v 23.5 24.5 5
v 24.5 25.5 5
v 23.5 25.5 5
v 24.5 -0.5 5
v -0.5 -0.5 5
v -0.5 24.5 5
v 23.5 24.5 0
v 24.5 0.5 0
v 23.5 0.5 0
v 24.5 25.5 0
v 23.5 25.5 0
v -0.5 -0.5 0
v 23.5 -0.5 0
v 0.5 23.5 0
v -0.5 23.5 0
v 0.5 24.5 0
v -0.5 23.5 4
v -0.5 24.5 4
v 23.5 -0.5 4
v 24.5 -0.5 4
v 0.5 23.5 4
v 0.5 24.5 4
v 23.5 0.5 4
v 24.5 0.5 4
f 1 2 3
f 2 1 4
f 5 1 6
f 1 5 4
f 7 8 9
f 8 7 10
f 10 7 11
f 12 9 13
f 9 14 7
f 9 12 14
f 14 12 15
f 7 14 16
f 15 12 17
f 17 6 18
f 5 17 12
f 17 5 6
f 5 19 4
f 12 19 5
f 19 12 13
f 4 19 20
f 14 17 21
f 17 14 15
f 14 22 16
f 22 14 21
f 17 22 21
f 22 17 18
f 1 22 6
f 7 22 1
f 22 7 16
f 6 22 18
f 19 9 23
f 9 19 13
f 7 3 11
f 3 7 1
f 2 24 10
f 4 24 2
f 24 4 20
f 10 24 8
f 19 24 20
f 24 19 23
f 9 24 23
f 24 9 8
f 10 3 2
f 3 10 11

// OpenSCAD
union() {
    translate([0, 0, 2.5]) cube([1, 1, 5], center=true);
    translate([0, 1, 2.5]) cube([1, 1, 5], center=true);
    translate([0, 2, 2.5]) cube([1, 1, 5], center=true);
    translate([0, 3, 2.5]) cube([1, 1, 5], center=true);
    translate([0, 4, 2.5]) cube([1, 1, 5], center=true);
    translate([0, 5, 2.5]) cube([1, 1, 5], center=true);
    translate([0, 6, 2.5]) cube([1, 1, 5], center=true);
    translate([0, 7, 2.5]) cube([1, 1, 5], center=true);
    translate([0, 8, 2.5]) cube([1, 1, 5], center=true);
    translate([0, 9, 2.5]) cube([1, 1, 5], center=true);
    translate([0, 10, 2.5]) cube([1, 1, 5], center=true);
    translate([0, 11, 2.5]) cube([1, 1, 5], center=true);
    translate([0, 12, 2.5]) cube([1, 1, 5], center=true);
    translate([0, 13, 2.5]) cube([1, 1, 5], center=true);
    translate([0, 14, 2.5]) cube([1, 1, 5], center=true);
    translate([0, 15, 2.5]) cube([1, 1, 5], center=true);
    translate([0, 16, 2.5]) cube([1, 1, 5], center=true);
    translate([0, 17, 2.5]) cube([1, 1, 5], center=true);
    translate([0, 18, 2.5]) cube([1, 1, 5], center=true);
    translate([0, 19, 2.5]) cube([1, 1, 5], center=true);
    translate([0, 20, 2.5]) cube([1, 1, 5], center=true);
    translate([0, 21, 2.5]) cube([1, 1, 5], center=true);
    translate([0, 22, 2.5]) cube([1, 1, 5], center=true);
    translate([0, 23, 2.5]) cube([1, 1, 5], center=true);
    translate([0, 24, 4.5]) color([1, 0, 0]) cube([1, 1, 1], center=true);
    translate([1, 0, 2.5]) cube([1, 1, 5], center=true);
    translate([1, 1, 2.5]) cube([1, 1, 5], center=true);
    translate([1, 2, 2.5]) cube([1, 1, 5], center=true);
    translate([1, 3, 2.5]) cube([1, 1, 5], center=true);
    translate([1, 4, 2.5]) cube([1, 1, 5], center=true);
    translate([1, 5, 2.5]) cube([1, 1, 5], center=true);
    translate([1, 6, 2.5]) cube([1, 1, 5], center=true);
    translate([1, 7, 2.5]) cube([1, 1, 5], center=true);
    translate([1, 8, 2.5]) cube([1, 1, 5], center=true);
    translate([1, 9, 2.5]) cube([1, 1, 5], center=true);
    translate([1, 10, 2.5]) cube([1, 1, 5], center=true);
    translate([1, 11, 2.5]) cube([1, 1, 5], center=true);
    translate([1, 12, 2.5]) cube([1, 1, 5], center=true);
    translate([1, 13, 2.5]) cube([1, 1, 5], center=true);
    translate([1, 14, 2.5]) cube([1, 1, 5], center=true);
    translate([1, 15, 2.5]) cube([1, 1, 5], center=true);
    translate([1, 16, 2.5]) cube([1, 1, 5], center=true);
    translate([1, 17, 2.5]) cube([1, 1, 5], center=true);
    translate([1, 18, 2.5]) cube([1, 1, 5], center=true);
    translate([1, 19, 2.5]) cube([1, 1, 5], center=true);
    translate([1, 20, 2.5]) cube([1, 1, 5], center=true);
    translate([1, 21, 2.5]) cube([1, 1, 5], center=true);
    translate([1, 22, 2.5]) cube([1, 1, 5], center=true);
    translate([1, 23, 2.5]) cube([1, 1, 5], center=true);
    translate([1, 24, 2.5]) cube([1, 1, 5], center=true);
    translate([2, 0, 2.5]) cube([1, 1, 5], center=true);
    translate([2, 1, 2.5]) cube([1, 1, 5], center=true);
    translate([2, 2, 2.5]) cube([1, 1, 5], center=true);
    translate([2, 3, 2.5]) cube([1, 1, 5], center=true);
    translate([2, 4, 2.5]) cube([1, 1, 5], center=true);
    translate([2, 5, 2.5]) cube([1, 1, 5], center=true);
    translate([2, 6, 2.5]) cube([1, 1, 5], center=true);
    translate([2, 7, 2.5]) cube([1, 1, 5], center=true);
    translate([2, 8, 2.5]) cube([1, 1, 5], center=true);
    translate([2, 9, 2.5]) cube([1, 1, 5], center=true);
    translate([2, 10, 2.5]) cube([1, 1, 5], center=true);
    translate([2, 11, 2.5]) cube([1, 1, 5], center=true);
    translate([2, 12, 2.5]) cube([1, 1, 5], center=true);
    translate([2, 13, 2.5]) cube([1, 1, 5], center=true);
    translate([2, 14, 2.5]) cube([1, 1, 5], center=true);
    translate([2, 15, 2.5]) cube([1, 1, 5], center=true);
    translate([2, 16, 2.5]) cube([1, 1, 5], center=true);
    translate([2, 17, 2.5]) cube([1, 1, 5], center=true);
    translate([2, 18, 2.5]) cube([1, 1, 5], center=true);
    translate([2, 19, 2.5]) cube([1, 1, 5], center=true);
    translate([2, 20, 2.5]) cube([1, 1, 5], center=true);
    translate([2, 21, 2.5]) cube([1, 1, 5], center=true);
    translate([2, 22, 2.5]) cube([1, 1, 5], center=true);
    translate([2, 23, 2.5]) cube([1, 1, 5], center=true);
    translate([2, 24, 2.5]) cube([1, 1, 5], center=true);
    translate([3, 0, 2.5]) cube([1, 1, 5], center=true);
    translate([3, 1, 2.5]) cube([1, 1, 5], center=true);
    translate([3, 2, 2.5]) cube([1, 1, 5], center=true);
    translate([3, 3, 2.5]) cube([1, 1, 5], center=true);
    translate([3, 4, 2.5]) cube([1, 1, 5], center=true);
    translate([3, 5, 2.5]) cube([1, 1, 5], center=true);
    translate([3, 6, 2.5]) cube([1, 1, 5], center=true);
    translate([3, 7, 2.5]) cube([1, 1, 5], center=true);
    translate([3, 8, 2.5]) cube([1, 1, 5], center=true);
    translate([3, 9, 2.5]) cube([1, 1, 5], center=true);
    translate([3, 10, 2.5]) cube([1, 1, 5], center=true);
    translate([3, 11, 2.5]) cube([1, 1, 5], center=true);
    translate([3, 12, 2.5]) cube([1, 1, 5], center=true);
    translate([3, 13, 2.5]) cube([1, 1, 5], center=true);
    translate([3, 14, 2.5]) cube([1, 1, 5], center=true);
    translate([3, 15, 2.5]) cube([1, 1, 5], center=true);
    translate([3, 16, 2.5]) cube([1, 1, 5], center=true);
    translate([3, 17, 2.5]) cube([1, 1, 5], center=true);
    translate([3, 18, 2.5]) cube([1, 1, 5], center=true);
    translate([3, 19, 2.5]) cube([1, 1, 5], center=true);
    translate([3, 20, 2.5]) cube([1, 1, 5], center=true);
    translate([3, 21, 2.5]) cube([1, 1, 5], center=true);
    translate([3, 22, 2.5]) cube([1, 1, 5], center=true);
    translate([3, 23, 2.5]) cube([1, 1, 5], center=true);
    translate([3, 24, 2.5]) cube([1, 1, 5], center=true);
    translate([4, 0, 2.5]) cube([1, 1, 5], center=true);
    translate([4, 1, 2.5]) cube([1, 1, 5], center=true);
    translate([4, 2, 2.5]) cube([1, 1, 5], center=true);
    translate([4, 3, 2.5]) cube([1, 1, 5], center=true);
    translate([4, 4, 2.5]) cube([1, 1, 5], center=true);
    translate([4, 5, 2.5]) cube([1, 1, 5], center=true);
    translate([4, 6, 2.5]) cube([1, 1, 5], center=true);
    translate([4, 7, 2.5]) cube([1, 1, 5], center=true);
    translate([4, 8, 2.5]) cube([1, 1, 5], center=true);
    translate([4, 9, 2.5]) cube([1, 1, 5], center=true);
    translate([4, 10, 2.5]) cube([1, 1, 5], center=true);
    translate([4, 11, 2.5]) cube([1, 1, 5], center=true);
    translate([4, 12, 2.5]) cube([1, 1, 5], center=true);
    translate([4, 13, 2.5]) cube([1, 1, 5], center=true);
    translate([4, 14, 2.5]) cube([1, 1, 5], center=true);
    translate([4, 15, 2.5]) cube([1, 1, 5], center=true);
    translate([4, 16, 2.5]) cube([1, 1, 5], center=true);
    translate([4, 17, 2.5]) cube([1, 1, 5], center=true);
    translate([4, 18, 2.5]) cube([1, 1, 5], center=true);
    translate([4, 19, 2.5]) cube([1, 1, 5], center=true);
    translate([4, 20, 2.5]) cube([1, 1, 5], center=true);
    translate([4, 21, 2.5]) cube([1, 1, 5], center=true);
    translate([4, 22, 2.5]) cube([1, 1, 5], center=true);
    translate([4, 23, 2.5]) cube([1, 1, 5], center=true);
    translate([4, 24, 2.5]) cube([1, 1, 5], center=true);
    translate([5, 0, 2.5]) cube([1, 1, 5], center=true);
    translate([5, 1, 2.5]) cube([1, 1, 5], center=true);
    translate([5, 2, 2.5]) cube([1, 1, 5], center=true);
    translate([5, 3, 2.5]) cube([1, 1, 5], center=true);
    translate([5, 4, 2.5]) cube([1, 1, 5], center=true);
    translate([5, 5, 2.5]) cube([1, 1, 5], center=true);
    translate([5, 6, 2.5]) cube([1, 1, 5], center=true);
    translate([5, 7, 2.5]) cube([1, 1, 5], center=true);
    translate([5, 8, 2.5]) cube([1, 1, 5], center=true);
    translate([5, 9, 2.5]) cube([1, 1, 5], center=true);
    translate([5, 10, 2.5]) cube([1, 1, 5], center=true);
    translate([5, 11, 2.5]) cube([1, 1, 5], center=true);
    translate([5, 12, 2.5]) cube([1, 1, 5], center=true);
    translate([5, 13, 2.5]) cube([1, 1, 5], center=true);
    translate([5, 14, 2.5]) cube([1, 1, 5], center=true);
    translate([5, 15, 2.5]) cube([1, 1, 5], center=true);
    translate([5, 16, 2.5]) cube([1, 1, 5], center=true);
    translate([5, 17, 2.5]) cube([1, 1, 5], center=true);
    translate([5, 18, 2.5]) cube([1, 1, 5], center=true);
    translate([5, 19, 2.5]) cube([1, 1, 5], center=true);
    translate([5, 20, 2.5]) cube([1, 1, 5], center=true);
    translate([5, 21, 2.5]) cube([1, 1, 5], center=true);
    translate([5, 22, 2.5]) cube([1, 1, 5], center=true);
    translate([5, 23, 2.5]) cube([1, 1, 5], center=true);
    translate([5, 24, 2.5]) cube([1, 1, 5], center=true);
    translate([6, 0, 2.5]) cube([1, 1, 5], center=true);
    translate([6, 1, 2.5]) cube([1, 1, 5], center=true);
    translate([6, 2, 2.5]) cube([1, 1, 5], center=true);
    translate([6, 3, 2.5]) cube([1, 1, 5], center=true);
    translate([6, 4, 2.5]) cube([1, 1, 5], center=true);
    translate([6, 5, 2.5]) cube([1, 1, 5], center=true);
    translate([6, 6, 2.5]) cube([1, 1, 5], center=true);
    translate([6, 7, 2.5]) cube([1, 1, 5], center=true);
    translate([6, 8, 2.5]) cube([1, 1, 5], center=true);
    translate([6, 9, 2.5]) cube([1, 1, 5], center=true);
    translate([6, 10, 2.5]) cube([1, 1, 5], center=true);
    translate([6, 11, 2.5]) cube([1, 1, 5], center=true);
    translate([6, 12, 2.5]) cube([1, 1, 5], center=true);
    translate([6, 13, 2.5]) cube([1, 1, 5], center=true);
    translate([6, 14, 2.5]) cube([1, 1, 5], center=true);
    translate([6, 15, 2.5]) cube([1, 1, 5], center=true);
    translate([6, 16, 2.5]) cube([1, 1, 5], center=true);
    translate([6, 17, 2.5]) cube([1, 1, 5], center=true);
    translate([6, 18, 2.5]) cube([1, 1, 5], center=true);
    translate([6, 19, 2.5]) cube([1, 1, 5], center=true);
    translate([6, 20, 2.5]) cube([1, 1, 5], center=true);
    translate([6, 21, 2.5]) cube([1, 1, 5], center=true);
    translate([6, 22, 2.5]) cube([1, 1, 5], center=true);
    translate([6, 23, 2.5]) cube([1, 1, 5], center=true);
    translate([6, 24, 2.5]) cube([1, 1, 5], center=true);
    translate([7, 0, 2.5]) cube([1, 1, 5], center=true);
    translate([7, 1, 2.5]) cube([1, 1, 5], center=true);
    translate([7, 2, 2.5]) cube([1, 1, 5], center=true);
    translate([7, 3, 2.5]) cube([1, 1, 5], center=true);
    translate([7, 4, 2.5]) cube([1, 1, 5], center=true);
    translate([7, 5, 2.5]) cube([1, 1, 5], center=true);
    translate([7, 6, 2.5]) cube([1, 1, 5], center=true);
    translate([7, 7, 2.5]) cube([1, 1, 5], center=true);
    translate([7, 8, 2.5]) cube([1, 1, 5], center=true);
    translate([7, 9, 2.5]) cube([1, 1, 5], center=true);
    translate([7, 10, 2.5]) cube([1, 1, 5], center=true);
    translate([7, 11, 2.5]) cube([1, 1, 5], center=true);
    translate([7, 12, 2.5]) cube([1, 1, 5], center=true);
    translate([7, 13, 2.5]) cube([1, 1, 5], center=true);
    translate([7, 14, 2.5]) cube([1, 1, 5], center=true);
    translate([7, 15, 2.5]) cube([1, 1, 5], center=true);
    translate([7, 16, 2.5]) cube([1, 1, 5], center=true);
    translate([7, 17, 2.5]) cube([1, 1, 5], center=true);
    translate([7, 18, 2.5]) cube([1, 1, 5], center=true);
    translate([7, 19, 2.5]) cube([1, 1, 5], center=true);
    translate([7, 20, 2.5]) cube([1, 1, 5], center=true);
    translate([7, 21, 2.5]) cube([1, 1, 5], center=true);
    translate([7, 22, 2.5]) cube([1, 1, 5], center=true);
    translate([7, 23, 2.5]) cube([1, 1, 5], center=true);
    translate([7, 24, 2.5]) cube([1, 1, 5], center=true);
    translate([8, 0, 2.5]) cube([1, 1, 5], center=true);
    translate([8, 1, 2.5]) cube([1, 1, 5], center=true);
    translate([8, 2, 2.5]) cube([1, 1, 5], center=true);
    translate([8, 3, 2.5]) cube([1, 1, 5], center=true);
    translate([8, 4, 2.5]) cube([1, 1, 5], center=true);
    translate([8, 5, 2.5]) cube([1, 1, 5], center=true);
    translate([8, 6, 2.5]) cube([1, 1, 5], center=true);
    translate([8, 7, 2.5]) cube([1, 1, 5], center=true);
    translate([8, 8, 2.5]) cube([1, 1, 5], center=true);
    translate([8, 9, 2.5]) cube([1, 1, 5], center=true);
    translate([8, 10, 2.5]) cube([1, 1, 5], center=true);
    translate([8, 11, 2.5]) cube([1, 1, 5], center=true);
    translate([8, 12, 2.5]) cube([1, 1, 5], center=true);
    translate([8, 13, 2.5]) cube([1, 1, 5], center=true);
    translate([8, 14, 2.5]) cube([1, 1, 5], center=true);
    translate([8, 15, 2.5]) cube([1, 1, 5], center=true);
    translate([8, 16, 2.5]) cube([1, 1, 5], center=true);
    translate([8, 17, 2.5]) cube([1, 1, 5], center=true);
    translate([8, 18, 2.5]) cube([1, 1, 5], center=true);
    translate([8, 19, 2.5]) cube([1, 1, 5], center=true);
    translate([8, 20, 2.5]) cube([1, 1, 5], center=true);
    translate([8, 21, 2.5]) cube([1, 1, 5], center=true);
    translate([8, 22, 2.5]) cube([1, 1, 5], center=true);
    translate([8, 23, 2.5]) cube([1, 1, 5], center=true);
    translate([8, 24, 2.5]) cube([1, 1, 5], center=true);
    translate([9, 0, 2.5]) cube([1, 1, 5], center=true);
    translate([9, 1, 2.5]) cube([1, 1, 5], center=true);
    translate([9, 2, 2.5]) cube([1, 1, 5], center=true);
    translate([9, 3, 2.5]) cube([1, 1, 5], center=true);
    translate([9, 4, 2.5]) cube([1, 1, 5], center=true);
    translate([9, 5, 2.5]) cube([1, 1, 5], center=true);
    translate([9, 6, 2.5]) cube([1, 1, 5], center=true);
    translate([9, 7, 2.5]) cube([1, 1, 5], center=true);
    translate([9, 8, 2.5]) cube([1, 1, 5], center=true);
    translate([9, 9, 2.5]) cube([1, 1, 5], center=true);
    translate([9, 10, 2.5]) cube([1, 1, 5], center=true);
    translate([9, 11, 2.5]) cube([1, 1, 5], center=true);
    translate([9, 12, 2.5]) cube([1, 1, 5], center=true);
    translate([9, 13, 2.5]) cube([1, 1, 5], center=true);
    translate([9, 14, 2.5]) cube([1, 1, 5], center=true);
    translate([9, 15, 2.5]) cube([1, 1, 5], center=true);
    translate([9, 16, 2.5]) cube([1, 1, 5], center=true);
    translate([9, 17, 2.5]) cube([1, 1, 5], center=true);
    translate([9, 18, 2.5]) cube([1, 1, 5], center=true);
    translate([9, 19, 2.5]) cube([1, 1, 5], center=true);
    translate([9, 20, 2.5]) cube([1, 1, 5], center=true);
    translate([9, 21, 2.5]) cube([1, 1, 5], center=true);
    translate([9, 22, 2.5]) cube([1, 1, 5], center=true);
    translate([9, 23, 2.5]) cube([1, 1, 5], center=true);
    translate([9, 24, 2.5]) cube([1, 1, 5], center=true);
    translate([10, 0, 2.5]) cube([1, 1, 5], center=true);
    translate([10, 1, 2.5]) cube([1, 1, 5], center=true);
    translate([10, 2, 2.5]) cube([1, 1, 5], center=true);
    translate([10, 3, 2.5]) cube([1, 1, 5], center=true);
    translate([10, 4, 2.5]) cube([1, 1, 5], center=true);
    translate([10, 5, 2.5]) cube([1, 1, 5], center=true);
    translate([10, 6, 2.5]) cube([1, 1, 5], center=true);
    translate([10, 7, 2.5]) cube([1, 1, 5], center=true);
    translate([10, 8, 2.5]) cube([1, 1, 5], center=true);
    translate([10, 9, 2.5]) cube([1, 1, 5], center=true);
    translate([10, 10, 2.5]) cube([1, 1, 5], center=true);
    translate([10, 11, 2.5]) cube([1, 1, 5], center=true);
    translate([10, 12, 2.5]) cube([1, 1, 5], center=true);
    translate([10, 13, 2.5]) cube([1, 1, 5], center=true);
    translate([10, 14, 2.5]) cube([1, 1, 5], center=true);
    translate([10, 15, 2.5]) cube([1, 1, 5], center=true);
    translate([10, 16, 2.5]) cube([1, 1, 5], center=true);
    translate([10, 17, 2.5]) cube([1, 1, 5], center=true);
    translate([10, 18, 2.5]) cube([1, 1, 5], center=true);
    translate([10, 19, 2.5]) cube([1, 1, 5], center=true);
    translate([10, 20, 2.5]) cube([1, 1, 5], center=true);
    translate([10, 21, 2.5]) cube([1, 1, 5], center=true);
    translate([10, 22, 2.5]) cube([1, 1, 5], center=true);
    translate([10, 23, 2.5]) cube([1, 1, 5], center=true);
    translate([10, 24, 2.5]) cube([1, 1, 5], center=true);
    translate([11, 0, 2.5]) cube([1, 1, 5], center=true);
    translate([11, 1, 2.5]) cube([1, 1, 5], center=true);
    translate([11, 2, 2.5]) cube([1, 1, 5], center=true);
    translate([11, 3, 2.5]) cube([1, 1, 5], center=true);
    translate([11, 4, 2.5]) cube([1, 1, 5], center=true);
    translate([11, 5, 2.5]) cube([1, 1, 5], center=true);
    translate([11, 6, 2.5]) cube([1, 1, 5], center=true);
    translate([11, 7, 2.5]) cube([1, 1, 5], center=true);
    translate([11, 8, 2.5]) cube([1, 1, 5], center=true);
    translate([11, 9, 2.5]) cube([1, 1, 5], center=true);
    translate([11, 10, 2.5]) cube([1, 1, 5], center=true);
    translate([11, 11, 2.5]) cube([1, 1, 5], center=true);
    translate([11, 12, 2.5]) cube([1, 1, 5], center=true);
    translate([11, 13, 2.5]) cube([1, 1, 5], center=true);
    translate([11, 14, 2.5]) cube([1, 1, 5], center=true);
    translate([11, 15, 2.5]) cube([1, 1, 5], center=true);
    translate([11, 16, 2.5]) cube([1, 1, 5], center=true);
    translate([11, 17, 2.5]) cube([1, 1, 5], center=true);
    translate([11, 18, 2.5]) cube([1, 1, 5], center=true);
    translate([11, 19, 2.5]) cube([1, 1, 5], center=true);
    translate([11, 20, 2.5]) cube([1, 1, 5], center=true);
    translate([11, 21, 2.5]) cube([1, 1, 5], center=true);
    translate([11, 22, 2.5]) cube([1, 1, 5], center=true);
    translate([11, 23, 2.5]) cube([1, 1, 5], center=true);
    translate([11, 24, 2.5]) cube([1, 1, 5], center=true);
    translate([12, 0, 2.5]) cube([1, 1, 5], center=true);
    translate([12, 1, 2.5]) cube([1, 1, 5], center=true);
    translate([12, 2, 2.5]) cube([1, 1, 5], center=true);
    translate([12, 3, 2.5]) cube([1, 1, 5], center=true);
    translate([12, 4, 2.5]) cube([1, 1, 5], center=true);
    translate([12, 5, 2.5]) cube([1, 1, 5], center=true);
    translate([12, 6, 2.5]) cube([1, 1, 5], center=true);
    translate([12, 7, 2.5]) cube([1, 1, 5], center=true);
    translate([12, 8, 2.5]) cube([1, 1, 5], center=true);
    translate([12, 9, 2.5]) cube([1, 1, 5], center=true);
    translate([12, 10, 2.5]) cube([1, 1, 5], center=true);
    translate([12, 11, 2.5]) cube([1, 1, 5], center=true);
    translate([12, 12, 2.5]) cube([1, 1, 5], center=true);
    translate([12, 13, 2.5]) cube([1, 1, 5], center=true);
    translate([12, 14, 2.5]) cube([1, 1, 5], center=true);
    translate([12, 15, 2.5]) cube([1, 1, 5], center=true);
    translate([12, 16, 2.5]) cube([1, 1, 5], center=true);
    translate([12, 17, 2.5]) cube([1, 1, 5], center=true);
    translate([12, 18, 2.5]) cube([1, 1, 5], center=true);
    translate([12, 19, 2.5]) cube([1, 1, 5], center=true);
    translate([12, 20, 2.5]) cube([1, 1, 5], center=true);
    translate([12, 21, 2.5]) cube([1, 1, 5], center=true);
    translate([12, 22, 2.5]) cube([1, 1, 5], center=true);
    translate([12, 23, 2.5]) cube([1, 1, 5], center=true);
    translate([12, 24, 2.5]) cube([1, 1, 5], center=true);
    translate([13, 0, 2.5]) cube([1, 1, 5], center=true);
    translate([13, 1, 2.5]) cube([1, 1, 5], center=true);
    translate([13, 2, 2.5]) cube([1, 1, 5], center=true);
    translate([13, 3, 2.5]) cube([1, 1, 5], center=true);
    translate([13, 4, 2.5]) cube([1, 1, 5], center=true);
    translate([13, 5, 2.5]) cube([1, 1, 5], center=true);
    translate([13, 6, 2.5]) cube([1, 1, 5], center=true);
    translate([13, 7, 2.5]) cube([1, 1, 5], center=true);
    translate([13, 8, 2.5]) cube([1, 1, 5], center=true);
    translate([13, 9, 2.5]) cube([1, 1, 5], center=true);
    translate([13, 10, 2.5]) cube([1, 1, 5], center=true);
    translate([13, 11, 2.5]) cube([1, 1, 5], center=true);
    translate([13, 12, 2.5]) cube([1, 1, 5], center=true);
    translate([13, 13, 2.5]) cube([1, 1, 5], center=true);
    translate([13, 14, 2.5]) cube([1, 1, 5], center=true);
    translate([13, 15, 2.5]) cube([1, 1, 5], center=true);
    translate([13, 16, 2.5]) cube([1, 1, 5], center=true);
    translate([13, 17, 2.5]) cube([1, 1, 5], center=true);
    translate([13, 18, 2.5]) cube([1, 1, 5], center=true);
    translate([13, 19, 2.5]) cube([1, 1, 5], center=true);
    translate([13, 20, 2.5]) cube([1, 1, 5], center=true);
    translate([13, 21, 2.5]) cube([1, 1, 5], center=true);
    translate([13, 22, 2.5]) cube([1, 1, 5], center=true);
    translate([13, 23, 2.5]) cube([1, 1, 5], center=true);
    translate([13, 24, 2.5]) cube([1, 1, 5], center=true);
    translate([14, 0, 2.5]) cube([1, 1, 5], center=true);
    translate([14, 1, 2.5]) cube([1, 1, 5], center=true);
    translate([14, 2, 2.5]) cube([1, 1, 5], center=true);
    translate([14, 3, 2.5]) cube([1, 1, 5], center=true);
    translate([14, 4, 2.5]) cube([1, 1, 5], center=true);
    translate([14, 5, 2.5]) cube([1, 1, 5], center=true);
    translate([14, 6, 2.5]) cube([1, 1, 5], center=true);
    translate([14, 7, 2.5]) cube([1, 1, 5], center=true);
    translate([14, 8, 2.5]) cube([1, 1, 5], center=true);
    translate([14, 9, 2.5]) cube([1, 1, 5], center=true);
    translate([14, 10, 2.5]) cube([1, 1, 5], center=true);
    translate([14, 11, 2.5]) cube([1, 1, 5], center=true);
    translate([14, 12, 2.5]) cube([1, 1, 5], center=true);
    translate([14, 13, 2.5]) cube([1, 1, 5], center=true);
    translate([14, 14, 2.5]) cube([1, 1, 5], center=true);
    translate([14, 15, 2.5]) cube([1, 1, 5], center=true);
    translate([14, 16, 2.5]) cube([1, 1, 5], center=true);
    translate([14, 17, 2.5]) cube([1, 1, 5], center=true);
    translate([14, 18, 2.5]) cube([1, 1, 5], center=true);
    translate([14, 19, 2.5]) cube([1, 1, 5], center=true);
    translate([14, 20, 2.5]) cube([1, 1, 5], center=true);
    translate([14, 21, 2.5]) cube([1, 1, 5], center=true);
    translate([14, 22, 2.5]) cube([1, 1, 5], center=true);
    translate([14, 23, 2.5]) cube([1, 1, 5], center=true);
    translate([14, 24, 2.5]) cube([1, 1, 5], center=true);
    translate([15, 0, 2.5]) cube([1, 1, 5], center=true);
    translate([15, 1, 2.5]) cube([1, 1, 5], center=true);
    translate([15, 2, 2.5]) cube([1, 1, 5], center=true);
    translate([15, 3, 2.5]) cube([1, 1, 5], center=true);
    translate([15, 4, 2.5]) cube([1, 1, 5], center=true);
    translate([15, 5, 2.5]) cube([1, 1, 5], center=true);
    translate([15, 6, 2.5]) cube([1, 1, 5], center=true);
    translate([15, 7, 2.5]) cube([1, 1, 5], center=true);
    translate([15, 8, 2.5]) cube([1, 1, 5], center=true);
    translate([15, 9, 2.5]) cube([1, 1, 5], center=true);
    translate([15, 10, 2.5]) cube([1, 1, 5], center=true);
    translate([15, 11, 2.5]) cube([1, 1, 5], center=true);
    translate([15, 12, 2.5]) cube([1, 1, 5], center=true);
    translate([15, 13, 2.5]) cube([1, 1, 5], center=true);
    translate([15, 14, 2.5]) cube([1, 1, 5], center=true);
    translate([15, 15, 2.5]) cube([1, 1, 5], center=true);
    translate([15, 16, 2.5]) cube([1, 1, 5], center=true);
    translate([15, 17, 2.5]) cube([1, 1, 5], center=true);
    translate([15, 18, 2.5]) cube([1, 1, 5], center=true);
    translate([15, 19, 2.5]) cube([1, 1, 5], center=true);
    translate([15, 20, 2.5]) cube([1, 1, 5], center=true);
    translate([15, 21, 2.5]) cube([1, 1, 5], center=true);
    translate([15, 22, 2.5]) cube([1, 1, 5], center=true);
    translate([15, 23, 2.5]) cube([1, 1, 5], center=true);
    translate([15, 24, 2.5]) cube([1, 1, 5], center=true);
    translate([16, 0, 2.5]) cube([1, 1, 5], center=true);
    translate([16, 1, 2.5]) cube([1, 1, 5], center=true);
    translate([16, 2, 2.5]) cube([1, 1, 5], center=true);
    translate([16, 3, 2.5]) cube([1, 1, 5], center=true);
    translate([16, 4, 2.5]) cube([1, 1, 5], center=true);
    translate([16, 5, 2.5]) cube([1, 1, 5], center=true);
    translate([16, 6, 2.5]) cube([1, 1, 5], center=true);
    translate([16, 7, 2.5]) cube([1, 1, 5], center=true);
    translate([16, 8, 2.5]) cube([1, 1, 5], center=true);
    translate([16, 9, 2.5]) cube([1, 1, 5], center=true);
    translate([16, 10, 2.5]) cube([1, 1, 5], center=true);
    translate([16, 11, 2.5]) cube([1, 1, 5], center=true);
    translate([16, 12, 2.5]) cube([1, 1, 5], center=true);
    translate([16, 13, 2.5]) cube([1, 1, 5], center=true);
    translate([16, 14, 2.5]) cube([1, 1, 5], center=true);
    translate([16, 15, 2.5]) cube([1, 1, 5], center=true);
    translate([16, 16, 2.5]) cube([1, 1, 5], center=true);
    translate([16, 17, 2.5]) cube([1, 1, 5], center=true);
    translate([16, 18, 2.5]) cube([1, 1, 5], center=true);
    translate([16, 19, 2.5]) cube([1, 1, 5], center=true);
    translate([16, 20, 2.5]) cube([1, 1, 5], center=true);
    translate([16, 21, 2.5]) cube([1, 1, 5], center=true);
    translate([16, 22, 2.5]) cube([1, 1, 5], center=true);
    translate([16, 23, 2.5]) cube([1, 1, 5], center=true);
    translate([16, 24, 2.5]) cube([1, 1, 5], center=true);
    translate([17, 0, 2.5]) cube([1, 1, 5], center=true);
    translate([17, 1, 2.5]) cube([1, 1, 5], center=true);
    translate([17, 2, 2.5]) cube([1, 1, 5], center=true);
    translate([17, 3, 2.5]) cube([1, 1, 5], center=true);
    translate([17, 4, 2.5]) cube([1, 1, 5], center=true);
    translate([17, 5, 2.5]) cube([1, 1, 5], center=true);
    translate([17, 6, 2.5]) cube([1, 1, 5], center=true);
    translate([17, 7, 2.5]) cube([1, 1, 5], center=true);
    translate([17, 8, 2.5]) cube([1, 1, 5], center=true);
    translate([17, 9, 2.5]) cube([1, 1, 5], center=true);
    translate([17, 10, 2.5]) cube([1, 1, 5], center=true);
    translate([17, 11, 2.5]) cube([1, 1, 5], center=true);
    translate([17, 12, 2.5]) cube([1, 1, 5], center=true);
    translate([17, 13, 2.5]) cube([1, 1, 5], center=true);
    translate([17, 14, 2.5]) cube([1, 1, 5], center=true);
    translate([17, 15, 2.5]) cube([1, 1, 5], center=true);
    translate([17, 16, 2.5]) cube([1, 1, 5], center=true);
    translate([17, 17, 2.5]) cube([1, 1, 5], center=true);
    translate([17, 18, 2.5]) cube([1, 1, 5], center=true);
    translate([17, 19, 2.5]) cube([1, 1, 5], center=true);
    translate([17, 20, 2.5]) cube([1, 1, 5], center=true);
    translate([17, 21, 2.5]) cube([1, 1, 5], center=true);
    translate([17, 22, 2.5]) cube([1, 1, 5], center=true);
    translate([17, 23, 2.5]) cube([1, 1, 5], center=true);
    translate([17, 24, 2.5]) cube([1, 1, 5], center=true);
    translate([18, 0, 2.5]) cube([1, 1, 5], center=true);
    translate([18, 1, 2.5]) cube([1, 1, 5], center=true);
    translate([18, 2, 2.5]) cube([1, 1, 5], center=true);
    translate([18, 3, 2.5]) cube([1, 1, 5], center=true);
    translate([18, 4, 2.5]) cube([1, 1, 5], center=true);
    translate([18, 5, 2.5]) cube([1, 1, 5], center=true);
    translate([18, 6, 2.5]) cube([1, 1, 5], center=true);
    translate([18, 7, 2.5]) cube([1, 1, 5], center=true);
    translate([18, 8, 2.5]) cube([1, 1, 5], center=true);
    translate([18, 9, 2.5]) cube([1, 1, 5], center=true);
    translate([18, 10, 2.5]) cube([1, 1, 5], center=true);
    translate([18, 11, 2.5]) cube([1, 1, 5], center=true);
    translate([18, 12, 2.5]) cube([1, 1, 5], center=true);
    translate([18, 13, 2.5]) cube([1, 1, 5], center=true);
    translate([18, 14, 2.5]) cube([1, 1, 5], center=true);
    translate([18, 15, 2.5]) cube([1, 1, 5], center=true);
    translate([18, 16, 2.5]) cube([1, 1, 5], center=true);
    translate([18, 17, 2.5]) cube([1, 1, 5], center=true);
    translate([18, 18, 2.5]) cube([1, 1, 5], center=true);
    translate([18, 19, 2.5]) cube([1, 1, 5], center=true);
    translate([18, 20, 2.5]) cube([1, 1, 5], center=true);
    translate([18, 21, 2.5]) cube([1, 1, 5], center=true);
    translate([18, 22, 2.5]) cube([1, 1, 5], center=true);
    translate([18, 23, 2.5]) cube([1, 1, 5], center=true);
    translate([18, 24, 2.5]) cube([1, 1, 5], center=true);
    translate([19, 0, 2.5]) cube([1, 1, 5], center=true);
    translate([19, 1, 2.5]) cube([1, 1, 5], center=true);
    translate([19, 2, 2.5]) cube([1, 1, 5], center=true);
    translate([19, 3, 2.5]) cube([1, 1, 5], center=true);
    translate([19, 4, 2.5]) cube([1, 1, 5], center=true);
    translate([19, 5, 2.5]) cube([1, 1, 5], center=true);
    translate([19, 6, 2.5]) cube([1, 1, 5], center=true);
    translate([19, 7, 2.5]) cube([1, 1, 5], center=true);
    translate([19, 8, 2.5]) cube([1, 1, 5], center=true);
    translate([19, 9, 2.5]) cube([1, 1, 5], center=true);
    translate([19, 10, 2.5]) cube([1, 1, 5], center=true);
    translate([19, 11, 2.5]) cube([1, 1, 5], center=true);
    translate([19, 12, 2.5]) cube([1, 1, 5], center=true);
    translate([19, 13, 2.5]) cube([1, 1, 5], center=true);
    translate([19, 14, 2.5]) cube([1, 1, 5], center=true);
    translate([19, 15, 2.5]) cube([1, 1, 5], center=true);
    translate([19, 16, 2.5]) cube([1, 1, 5], center=true);
    translate([19, 17, 2.5]) cube([1, 1, 5], center=true);
    translate([19, 18, 2.5]) cube([1, 1, 5], center=true);
    translate([19, 19, 2.5]) cube([1, 1, 5], center=true);
    translate([19, 20, 2.5]) cube([1, 1, 5], center=true);
    translate([19, 21, 2.5]) cube([1, 1, 5], center=true);
    translate([19, 22, 2.5]) cube([1, 1, 5], center=true);
    translate([19, 23, 2.5]) cube([1, 1, 5], center=true);
    translate([19, 24, 2.5]) cube([1, 1, 5], center=true);
    translate([20, 0, 2.5]) cube([1, 1, 5], center=true);
    translate([20, 1, 2.5]) cube([1, 1, 5], center=true);
    translate([20, 2, 2.5]) cube([1, 1, 5], center=true);
    translate([20, 3, 2.5]) cube([1, 1, 5], center=true);
    translate([20, 4, 2.5]) cube([1, 1, 5], center=true);
    translate([20, 5, 2.5]) cube([1, 1, 5], center=true);
    translate([20, 6, 2.5]) cube([1, 1, 5], center=true);
    translate([20, 7, 2.5]) cube([1, 1, 5], center=true);
    translate([20, 8, 2.5]) cube([1, 1, 5], center=true);
    translate([20, 9, 2.5]) cube([1, 1, 5], center=true);
    translate([20, 10, 2.5]) cube([1, 1, 5], center=true);
    translate([20, 11, 2.5]) cube([1, 1, 5], center=true);
    translate([20, 12, 2.5]) cube([1, 1, 5], center=true);
    translate([20, 13, 2.5]) cube([1, 1, 5], center=true);
    translate([20, 14, 2.5]) cube([1, 1, 5], center=true);
    translate([20, 15, 2.5]) cube([1, 1, 5], center=true);
    translate([20, 16, 2.5]) cube([1, 1, 5], center=true);
    translate([20, 17, 2.5]) cube([1, 1, 5], center=true);
    translate([20, 18, 2.5]) cube([1, 1, 5], center=true);
    translate([20, 19, 2.5]) cube([1, 1, 5], center=true);
    translate([20, 20, 2.5]) cube([1, 1, 5], center=true);
    translate([20, 21, 2.5]) cube([1, 1, 5], center=true);
    translate([20, 22, 2.5]) cube([1, 1, 5], center=true);
    translate([20, 23, 2.5]) cube([1, 1, 5], center=true);
    translate([20, 24, 2.5]) cube([1, 1, 5], center=true);
    translate([21, 0, 2.5]) cube([1, 1, 5], center=true);
    translate([21, 1, 2.5]) cube([1, 1, 5], center=true);
    translate([21, 2, 2.5]) cube([1, 1, 5], center=true);
    translate([21, 3, 2.5]) cube([1, 1, 5], center=true);
    translate([21, 4, 2.5]) cube([1, 1, 5], center=true);
    translate([21, 5, 2.5]) cube([1, 1, 5], center=true);
    translate([21, 6, 2.5]) cube([1, 1, 5], center=true);
    translate([21, 7, 2.5]) cube([1, 1, 5], center=true);
    translate([21, 8, 2.5]) cube([1, 1, 5], center=true);
    translate([21, 9, 2.5]) cube([1, 1, 5], center=true);
    translate([21, 10, 2.5]) cube([1, 1, 5], center=true);
    translate([21, 11, 2.5]) cube([1, 1, 5], center=true);
    translate([21, 12, 2.5]) cube([1, 1, 5], center=true);
    translate([21, 13, 2.5]) cube([1, 1, 5], center=true);
    translate([21, 14, 2.5]) cube([1, 1, 5], center=true);
    translate([21, 15, 2.5]) cube([1, 1, 5], center=true);
    translate([21, 16, 2.5]) cube([1, 1, 5], center=true);
    translate([21, 17, 2.5]) cube([1, 1, 5], center=true);
    translate([21, 18, 2.5]) cube([1, 1, 5], center=true);
    translate([21, 19, 2.5]) cube([1, 1, 5], center=true);
    translate([21, 20, 2.5]) cube([1, 1, 5], center=true);
    translate([21, 21, 2.5]) cube([1, 1, 5], center=true);
    translate([21, 22, 2.5]) cube([1, 1, 5], center=true);
    translate([21, 23, 2.5]) cube([1, 1, 5], center=true);
    translate([21, 24, 2.5]) cube([1, 1, 5], center=true);
    translate([22, 0, 2.5]) cube([1, 1, 5], center=true);
    translate([22, 1, 2.5]) cube([1, 1, 5], center=true);
    translate([22, 2, 2.5]) cube([1, 1, 5], center=true);
    translate([22, 3, 2.5]) cube([1, 1, 5], center=true);
    translate([22, 4, 2.5]) cube([1, 1, 5], center=true);
    translate([22, 5, 2.5]) cube([1, 1, 5], center=true);
    translate([22, 6, 2.5]) cube([1, 1, 5], center=true);
    translate([22, 7, 2.5]) cube([1, 1, 5], center=true);
    translate([22, 8, 2.5]) cube([1, 1, 5], center=true);
    translate([22, 9, 2.5]) cube([1, 1, 5], center=true);
    translate([22, 10, 2.5]) cube([1, 1, 5], center=true);
    translate([22, 11, 2.5]) cube([1, 1, 5], center=true);
    translate([22, 12, 2.5]) cube([1, 1, 5], center=true);
    translate([22, 13, 2.5]) cube([1, 1, 5], center=true);
    translate([22, 14, 2.5]) cube([1, 1, 5], center=true);
    translate([22, 15, 2.5]) cube([1, 1, 5], center=true);
    translate([22, 16, 2.5]) cube([1, 1, 5], center=true);
    translate([22, 17, 2.5]) cube([1, 1, 5], center=true);
    translate([22, 18, 2.5]) cube([1, 1, 5], center=true);
    translate([22, 19, 2.5]) cube([1, 1, 5], center=true);
    translate([22, 20, 2.5]) cube([1, 1, 5], center=true);
    translate([22, 21, 2.5]) cube([1, 1, 5], center=true);
    translate([22, 22, 2.5]) cube([1, 1, 5], center=true);
    translate([22, 23, 2.5]) cube([1, 1, 5], center=true);
    translate([22, 24, 2.5]) cube([1, 1, 5], center=true);
    translate([23, 0, 2.5]) cube([1, 1, 5], center=true);
    translate([23, 1, 2.5]) cube([1, 1, 5], center=true);
    translate([23, 2, 2.5]) cube([1, 1, 5], center=true);
    translate([23, 3, 2.5]) cube([1, 1, 5], center=true);
    translate([23, 4, 2.5]) cube([1, 1, 5], center=true);
    translate([23, 5, 2.5]) cube([1, 1, 5], center=true);
    translate([23, 6, 2.5]) cube([1, 1, 5], center=true);
    translate([23, 7, 2.5]) cube([1, 1, 5], center=true);
    translate([23, 8, 2.5]) cube([1, 1, 5], center=true);
    translate([23, 9, 2.5]) cube([1, 1, 5], center=true);
    translate([23, 10, 2.5]) cube([1, 1, 5], center=true);
    translate([23, 11, 2.5]) cube([1, 1, 5], center=true);
    translate([23, 12, 2.5]) cube([1, 1, 5], center=true);
    translate([23, 13, 2.5]) cube([1, 1, 5], center=true);
    translate([23, 14, 2.5]) cube([1, 1, 5], center=true);
    translate([23, 15, 2.5]) cube([1, 1, 5], center=true);
    translate([23, 16, 2.5]) cube([1, 1, 5], center=true);
    translate([23, 17, 2.5]) cube([1, 1, 5], center=true);
    translate([23, 18, 2.5]) cube([1, 1, 5], center=true);
    translate([23, 19, 2.5]) cube([1, 1, 5], center=true);
    translate([23, 20, 2.5]) cube([1, 1, 5], center=true);
    translate([23, 21, 2.5]) cube([1, 1, 5], center=true);
    translate([23, 22, 2.5]) cube([1, 1, 5], center=true);
    translate([23, 23, 2.5]) cube([1, 1, 5], center=true);
    translate([23, 24, 2.5]) cube([1, 1, 5], center=true);
    translate([24, 0, 4.5]) color([0, 0, 1]) cube([1, 1, 1], center=true);
    translate([24, 1, 2.5]) cube([1, 1, 5], center=true);
    translate([24, 2, 2.5]) cube([1, 1, 5], center=true);
    translate([24, 3, 2.5]) cube([1, 1, 5], center=true);
    translate([24, 4, 2.5]) cube([1, 1, 5], center=true);
    translate([24, 5, 2.5]) cube([1, 1, 5], center=true);
    translate([24, 6, 2.5]) cube([1, 1, 5], center=true);
    translate([24, 7, 2.5]) cube([1, 1, 5], center=true);
    translate([24, 8, 2.5]) cube([1, 1, 5], center=true);
    translate([24, 9, 2.5]) cube([1, 1, 5], center=true);
    translate([24, 10, 2.5]) cube([1, 1, 5], center=true);
    translate([24, 11, 2.5]) cube([1, 1, 5], center=true);
    translate([24, 12, 2.5]) cube([1, 1, 5], center=true);
    translate([24, 13, 2.5]) cube([1, 1, 5], center=true);
    translate([24, 14, 2.5]) cube([1, 1, 5], center=true);
    translate([24, 15, 2.5]) cube([1, 1, 5], center=true);
    translate([24, 16, 2.5]) cube([1, 1, 5], center=true);
    translate([24, 17, 2.5]) cube([1, 1, 5], center=true);
    translate([24, 18, 2.5]) cube([1, 1, 5], center=true);
    translate([24, 19, 2.5]) cube([1, 1, 5], center=true);
    translate([24, 20, 2.5]) cube([1, 1, 5], center=true);
    translate([24, 21, 2.5]) cube([1, 1, 5], center=true);
    translate([24, 22, 2.5]) cube([1, 1, 5], center=true);
    translate([24, 23, 2.5]) cube([1, 1, 5], center=true);
    translate([24, 24, 2.5]) cube([1, 1, 5], center=true);
    translate([24, 25, 2.5]) cube([1, 1, 5], center=true);
}
